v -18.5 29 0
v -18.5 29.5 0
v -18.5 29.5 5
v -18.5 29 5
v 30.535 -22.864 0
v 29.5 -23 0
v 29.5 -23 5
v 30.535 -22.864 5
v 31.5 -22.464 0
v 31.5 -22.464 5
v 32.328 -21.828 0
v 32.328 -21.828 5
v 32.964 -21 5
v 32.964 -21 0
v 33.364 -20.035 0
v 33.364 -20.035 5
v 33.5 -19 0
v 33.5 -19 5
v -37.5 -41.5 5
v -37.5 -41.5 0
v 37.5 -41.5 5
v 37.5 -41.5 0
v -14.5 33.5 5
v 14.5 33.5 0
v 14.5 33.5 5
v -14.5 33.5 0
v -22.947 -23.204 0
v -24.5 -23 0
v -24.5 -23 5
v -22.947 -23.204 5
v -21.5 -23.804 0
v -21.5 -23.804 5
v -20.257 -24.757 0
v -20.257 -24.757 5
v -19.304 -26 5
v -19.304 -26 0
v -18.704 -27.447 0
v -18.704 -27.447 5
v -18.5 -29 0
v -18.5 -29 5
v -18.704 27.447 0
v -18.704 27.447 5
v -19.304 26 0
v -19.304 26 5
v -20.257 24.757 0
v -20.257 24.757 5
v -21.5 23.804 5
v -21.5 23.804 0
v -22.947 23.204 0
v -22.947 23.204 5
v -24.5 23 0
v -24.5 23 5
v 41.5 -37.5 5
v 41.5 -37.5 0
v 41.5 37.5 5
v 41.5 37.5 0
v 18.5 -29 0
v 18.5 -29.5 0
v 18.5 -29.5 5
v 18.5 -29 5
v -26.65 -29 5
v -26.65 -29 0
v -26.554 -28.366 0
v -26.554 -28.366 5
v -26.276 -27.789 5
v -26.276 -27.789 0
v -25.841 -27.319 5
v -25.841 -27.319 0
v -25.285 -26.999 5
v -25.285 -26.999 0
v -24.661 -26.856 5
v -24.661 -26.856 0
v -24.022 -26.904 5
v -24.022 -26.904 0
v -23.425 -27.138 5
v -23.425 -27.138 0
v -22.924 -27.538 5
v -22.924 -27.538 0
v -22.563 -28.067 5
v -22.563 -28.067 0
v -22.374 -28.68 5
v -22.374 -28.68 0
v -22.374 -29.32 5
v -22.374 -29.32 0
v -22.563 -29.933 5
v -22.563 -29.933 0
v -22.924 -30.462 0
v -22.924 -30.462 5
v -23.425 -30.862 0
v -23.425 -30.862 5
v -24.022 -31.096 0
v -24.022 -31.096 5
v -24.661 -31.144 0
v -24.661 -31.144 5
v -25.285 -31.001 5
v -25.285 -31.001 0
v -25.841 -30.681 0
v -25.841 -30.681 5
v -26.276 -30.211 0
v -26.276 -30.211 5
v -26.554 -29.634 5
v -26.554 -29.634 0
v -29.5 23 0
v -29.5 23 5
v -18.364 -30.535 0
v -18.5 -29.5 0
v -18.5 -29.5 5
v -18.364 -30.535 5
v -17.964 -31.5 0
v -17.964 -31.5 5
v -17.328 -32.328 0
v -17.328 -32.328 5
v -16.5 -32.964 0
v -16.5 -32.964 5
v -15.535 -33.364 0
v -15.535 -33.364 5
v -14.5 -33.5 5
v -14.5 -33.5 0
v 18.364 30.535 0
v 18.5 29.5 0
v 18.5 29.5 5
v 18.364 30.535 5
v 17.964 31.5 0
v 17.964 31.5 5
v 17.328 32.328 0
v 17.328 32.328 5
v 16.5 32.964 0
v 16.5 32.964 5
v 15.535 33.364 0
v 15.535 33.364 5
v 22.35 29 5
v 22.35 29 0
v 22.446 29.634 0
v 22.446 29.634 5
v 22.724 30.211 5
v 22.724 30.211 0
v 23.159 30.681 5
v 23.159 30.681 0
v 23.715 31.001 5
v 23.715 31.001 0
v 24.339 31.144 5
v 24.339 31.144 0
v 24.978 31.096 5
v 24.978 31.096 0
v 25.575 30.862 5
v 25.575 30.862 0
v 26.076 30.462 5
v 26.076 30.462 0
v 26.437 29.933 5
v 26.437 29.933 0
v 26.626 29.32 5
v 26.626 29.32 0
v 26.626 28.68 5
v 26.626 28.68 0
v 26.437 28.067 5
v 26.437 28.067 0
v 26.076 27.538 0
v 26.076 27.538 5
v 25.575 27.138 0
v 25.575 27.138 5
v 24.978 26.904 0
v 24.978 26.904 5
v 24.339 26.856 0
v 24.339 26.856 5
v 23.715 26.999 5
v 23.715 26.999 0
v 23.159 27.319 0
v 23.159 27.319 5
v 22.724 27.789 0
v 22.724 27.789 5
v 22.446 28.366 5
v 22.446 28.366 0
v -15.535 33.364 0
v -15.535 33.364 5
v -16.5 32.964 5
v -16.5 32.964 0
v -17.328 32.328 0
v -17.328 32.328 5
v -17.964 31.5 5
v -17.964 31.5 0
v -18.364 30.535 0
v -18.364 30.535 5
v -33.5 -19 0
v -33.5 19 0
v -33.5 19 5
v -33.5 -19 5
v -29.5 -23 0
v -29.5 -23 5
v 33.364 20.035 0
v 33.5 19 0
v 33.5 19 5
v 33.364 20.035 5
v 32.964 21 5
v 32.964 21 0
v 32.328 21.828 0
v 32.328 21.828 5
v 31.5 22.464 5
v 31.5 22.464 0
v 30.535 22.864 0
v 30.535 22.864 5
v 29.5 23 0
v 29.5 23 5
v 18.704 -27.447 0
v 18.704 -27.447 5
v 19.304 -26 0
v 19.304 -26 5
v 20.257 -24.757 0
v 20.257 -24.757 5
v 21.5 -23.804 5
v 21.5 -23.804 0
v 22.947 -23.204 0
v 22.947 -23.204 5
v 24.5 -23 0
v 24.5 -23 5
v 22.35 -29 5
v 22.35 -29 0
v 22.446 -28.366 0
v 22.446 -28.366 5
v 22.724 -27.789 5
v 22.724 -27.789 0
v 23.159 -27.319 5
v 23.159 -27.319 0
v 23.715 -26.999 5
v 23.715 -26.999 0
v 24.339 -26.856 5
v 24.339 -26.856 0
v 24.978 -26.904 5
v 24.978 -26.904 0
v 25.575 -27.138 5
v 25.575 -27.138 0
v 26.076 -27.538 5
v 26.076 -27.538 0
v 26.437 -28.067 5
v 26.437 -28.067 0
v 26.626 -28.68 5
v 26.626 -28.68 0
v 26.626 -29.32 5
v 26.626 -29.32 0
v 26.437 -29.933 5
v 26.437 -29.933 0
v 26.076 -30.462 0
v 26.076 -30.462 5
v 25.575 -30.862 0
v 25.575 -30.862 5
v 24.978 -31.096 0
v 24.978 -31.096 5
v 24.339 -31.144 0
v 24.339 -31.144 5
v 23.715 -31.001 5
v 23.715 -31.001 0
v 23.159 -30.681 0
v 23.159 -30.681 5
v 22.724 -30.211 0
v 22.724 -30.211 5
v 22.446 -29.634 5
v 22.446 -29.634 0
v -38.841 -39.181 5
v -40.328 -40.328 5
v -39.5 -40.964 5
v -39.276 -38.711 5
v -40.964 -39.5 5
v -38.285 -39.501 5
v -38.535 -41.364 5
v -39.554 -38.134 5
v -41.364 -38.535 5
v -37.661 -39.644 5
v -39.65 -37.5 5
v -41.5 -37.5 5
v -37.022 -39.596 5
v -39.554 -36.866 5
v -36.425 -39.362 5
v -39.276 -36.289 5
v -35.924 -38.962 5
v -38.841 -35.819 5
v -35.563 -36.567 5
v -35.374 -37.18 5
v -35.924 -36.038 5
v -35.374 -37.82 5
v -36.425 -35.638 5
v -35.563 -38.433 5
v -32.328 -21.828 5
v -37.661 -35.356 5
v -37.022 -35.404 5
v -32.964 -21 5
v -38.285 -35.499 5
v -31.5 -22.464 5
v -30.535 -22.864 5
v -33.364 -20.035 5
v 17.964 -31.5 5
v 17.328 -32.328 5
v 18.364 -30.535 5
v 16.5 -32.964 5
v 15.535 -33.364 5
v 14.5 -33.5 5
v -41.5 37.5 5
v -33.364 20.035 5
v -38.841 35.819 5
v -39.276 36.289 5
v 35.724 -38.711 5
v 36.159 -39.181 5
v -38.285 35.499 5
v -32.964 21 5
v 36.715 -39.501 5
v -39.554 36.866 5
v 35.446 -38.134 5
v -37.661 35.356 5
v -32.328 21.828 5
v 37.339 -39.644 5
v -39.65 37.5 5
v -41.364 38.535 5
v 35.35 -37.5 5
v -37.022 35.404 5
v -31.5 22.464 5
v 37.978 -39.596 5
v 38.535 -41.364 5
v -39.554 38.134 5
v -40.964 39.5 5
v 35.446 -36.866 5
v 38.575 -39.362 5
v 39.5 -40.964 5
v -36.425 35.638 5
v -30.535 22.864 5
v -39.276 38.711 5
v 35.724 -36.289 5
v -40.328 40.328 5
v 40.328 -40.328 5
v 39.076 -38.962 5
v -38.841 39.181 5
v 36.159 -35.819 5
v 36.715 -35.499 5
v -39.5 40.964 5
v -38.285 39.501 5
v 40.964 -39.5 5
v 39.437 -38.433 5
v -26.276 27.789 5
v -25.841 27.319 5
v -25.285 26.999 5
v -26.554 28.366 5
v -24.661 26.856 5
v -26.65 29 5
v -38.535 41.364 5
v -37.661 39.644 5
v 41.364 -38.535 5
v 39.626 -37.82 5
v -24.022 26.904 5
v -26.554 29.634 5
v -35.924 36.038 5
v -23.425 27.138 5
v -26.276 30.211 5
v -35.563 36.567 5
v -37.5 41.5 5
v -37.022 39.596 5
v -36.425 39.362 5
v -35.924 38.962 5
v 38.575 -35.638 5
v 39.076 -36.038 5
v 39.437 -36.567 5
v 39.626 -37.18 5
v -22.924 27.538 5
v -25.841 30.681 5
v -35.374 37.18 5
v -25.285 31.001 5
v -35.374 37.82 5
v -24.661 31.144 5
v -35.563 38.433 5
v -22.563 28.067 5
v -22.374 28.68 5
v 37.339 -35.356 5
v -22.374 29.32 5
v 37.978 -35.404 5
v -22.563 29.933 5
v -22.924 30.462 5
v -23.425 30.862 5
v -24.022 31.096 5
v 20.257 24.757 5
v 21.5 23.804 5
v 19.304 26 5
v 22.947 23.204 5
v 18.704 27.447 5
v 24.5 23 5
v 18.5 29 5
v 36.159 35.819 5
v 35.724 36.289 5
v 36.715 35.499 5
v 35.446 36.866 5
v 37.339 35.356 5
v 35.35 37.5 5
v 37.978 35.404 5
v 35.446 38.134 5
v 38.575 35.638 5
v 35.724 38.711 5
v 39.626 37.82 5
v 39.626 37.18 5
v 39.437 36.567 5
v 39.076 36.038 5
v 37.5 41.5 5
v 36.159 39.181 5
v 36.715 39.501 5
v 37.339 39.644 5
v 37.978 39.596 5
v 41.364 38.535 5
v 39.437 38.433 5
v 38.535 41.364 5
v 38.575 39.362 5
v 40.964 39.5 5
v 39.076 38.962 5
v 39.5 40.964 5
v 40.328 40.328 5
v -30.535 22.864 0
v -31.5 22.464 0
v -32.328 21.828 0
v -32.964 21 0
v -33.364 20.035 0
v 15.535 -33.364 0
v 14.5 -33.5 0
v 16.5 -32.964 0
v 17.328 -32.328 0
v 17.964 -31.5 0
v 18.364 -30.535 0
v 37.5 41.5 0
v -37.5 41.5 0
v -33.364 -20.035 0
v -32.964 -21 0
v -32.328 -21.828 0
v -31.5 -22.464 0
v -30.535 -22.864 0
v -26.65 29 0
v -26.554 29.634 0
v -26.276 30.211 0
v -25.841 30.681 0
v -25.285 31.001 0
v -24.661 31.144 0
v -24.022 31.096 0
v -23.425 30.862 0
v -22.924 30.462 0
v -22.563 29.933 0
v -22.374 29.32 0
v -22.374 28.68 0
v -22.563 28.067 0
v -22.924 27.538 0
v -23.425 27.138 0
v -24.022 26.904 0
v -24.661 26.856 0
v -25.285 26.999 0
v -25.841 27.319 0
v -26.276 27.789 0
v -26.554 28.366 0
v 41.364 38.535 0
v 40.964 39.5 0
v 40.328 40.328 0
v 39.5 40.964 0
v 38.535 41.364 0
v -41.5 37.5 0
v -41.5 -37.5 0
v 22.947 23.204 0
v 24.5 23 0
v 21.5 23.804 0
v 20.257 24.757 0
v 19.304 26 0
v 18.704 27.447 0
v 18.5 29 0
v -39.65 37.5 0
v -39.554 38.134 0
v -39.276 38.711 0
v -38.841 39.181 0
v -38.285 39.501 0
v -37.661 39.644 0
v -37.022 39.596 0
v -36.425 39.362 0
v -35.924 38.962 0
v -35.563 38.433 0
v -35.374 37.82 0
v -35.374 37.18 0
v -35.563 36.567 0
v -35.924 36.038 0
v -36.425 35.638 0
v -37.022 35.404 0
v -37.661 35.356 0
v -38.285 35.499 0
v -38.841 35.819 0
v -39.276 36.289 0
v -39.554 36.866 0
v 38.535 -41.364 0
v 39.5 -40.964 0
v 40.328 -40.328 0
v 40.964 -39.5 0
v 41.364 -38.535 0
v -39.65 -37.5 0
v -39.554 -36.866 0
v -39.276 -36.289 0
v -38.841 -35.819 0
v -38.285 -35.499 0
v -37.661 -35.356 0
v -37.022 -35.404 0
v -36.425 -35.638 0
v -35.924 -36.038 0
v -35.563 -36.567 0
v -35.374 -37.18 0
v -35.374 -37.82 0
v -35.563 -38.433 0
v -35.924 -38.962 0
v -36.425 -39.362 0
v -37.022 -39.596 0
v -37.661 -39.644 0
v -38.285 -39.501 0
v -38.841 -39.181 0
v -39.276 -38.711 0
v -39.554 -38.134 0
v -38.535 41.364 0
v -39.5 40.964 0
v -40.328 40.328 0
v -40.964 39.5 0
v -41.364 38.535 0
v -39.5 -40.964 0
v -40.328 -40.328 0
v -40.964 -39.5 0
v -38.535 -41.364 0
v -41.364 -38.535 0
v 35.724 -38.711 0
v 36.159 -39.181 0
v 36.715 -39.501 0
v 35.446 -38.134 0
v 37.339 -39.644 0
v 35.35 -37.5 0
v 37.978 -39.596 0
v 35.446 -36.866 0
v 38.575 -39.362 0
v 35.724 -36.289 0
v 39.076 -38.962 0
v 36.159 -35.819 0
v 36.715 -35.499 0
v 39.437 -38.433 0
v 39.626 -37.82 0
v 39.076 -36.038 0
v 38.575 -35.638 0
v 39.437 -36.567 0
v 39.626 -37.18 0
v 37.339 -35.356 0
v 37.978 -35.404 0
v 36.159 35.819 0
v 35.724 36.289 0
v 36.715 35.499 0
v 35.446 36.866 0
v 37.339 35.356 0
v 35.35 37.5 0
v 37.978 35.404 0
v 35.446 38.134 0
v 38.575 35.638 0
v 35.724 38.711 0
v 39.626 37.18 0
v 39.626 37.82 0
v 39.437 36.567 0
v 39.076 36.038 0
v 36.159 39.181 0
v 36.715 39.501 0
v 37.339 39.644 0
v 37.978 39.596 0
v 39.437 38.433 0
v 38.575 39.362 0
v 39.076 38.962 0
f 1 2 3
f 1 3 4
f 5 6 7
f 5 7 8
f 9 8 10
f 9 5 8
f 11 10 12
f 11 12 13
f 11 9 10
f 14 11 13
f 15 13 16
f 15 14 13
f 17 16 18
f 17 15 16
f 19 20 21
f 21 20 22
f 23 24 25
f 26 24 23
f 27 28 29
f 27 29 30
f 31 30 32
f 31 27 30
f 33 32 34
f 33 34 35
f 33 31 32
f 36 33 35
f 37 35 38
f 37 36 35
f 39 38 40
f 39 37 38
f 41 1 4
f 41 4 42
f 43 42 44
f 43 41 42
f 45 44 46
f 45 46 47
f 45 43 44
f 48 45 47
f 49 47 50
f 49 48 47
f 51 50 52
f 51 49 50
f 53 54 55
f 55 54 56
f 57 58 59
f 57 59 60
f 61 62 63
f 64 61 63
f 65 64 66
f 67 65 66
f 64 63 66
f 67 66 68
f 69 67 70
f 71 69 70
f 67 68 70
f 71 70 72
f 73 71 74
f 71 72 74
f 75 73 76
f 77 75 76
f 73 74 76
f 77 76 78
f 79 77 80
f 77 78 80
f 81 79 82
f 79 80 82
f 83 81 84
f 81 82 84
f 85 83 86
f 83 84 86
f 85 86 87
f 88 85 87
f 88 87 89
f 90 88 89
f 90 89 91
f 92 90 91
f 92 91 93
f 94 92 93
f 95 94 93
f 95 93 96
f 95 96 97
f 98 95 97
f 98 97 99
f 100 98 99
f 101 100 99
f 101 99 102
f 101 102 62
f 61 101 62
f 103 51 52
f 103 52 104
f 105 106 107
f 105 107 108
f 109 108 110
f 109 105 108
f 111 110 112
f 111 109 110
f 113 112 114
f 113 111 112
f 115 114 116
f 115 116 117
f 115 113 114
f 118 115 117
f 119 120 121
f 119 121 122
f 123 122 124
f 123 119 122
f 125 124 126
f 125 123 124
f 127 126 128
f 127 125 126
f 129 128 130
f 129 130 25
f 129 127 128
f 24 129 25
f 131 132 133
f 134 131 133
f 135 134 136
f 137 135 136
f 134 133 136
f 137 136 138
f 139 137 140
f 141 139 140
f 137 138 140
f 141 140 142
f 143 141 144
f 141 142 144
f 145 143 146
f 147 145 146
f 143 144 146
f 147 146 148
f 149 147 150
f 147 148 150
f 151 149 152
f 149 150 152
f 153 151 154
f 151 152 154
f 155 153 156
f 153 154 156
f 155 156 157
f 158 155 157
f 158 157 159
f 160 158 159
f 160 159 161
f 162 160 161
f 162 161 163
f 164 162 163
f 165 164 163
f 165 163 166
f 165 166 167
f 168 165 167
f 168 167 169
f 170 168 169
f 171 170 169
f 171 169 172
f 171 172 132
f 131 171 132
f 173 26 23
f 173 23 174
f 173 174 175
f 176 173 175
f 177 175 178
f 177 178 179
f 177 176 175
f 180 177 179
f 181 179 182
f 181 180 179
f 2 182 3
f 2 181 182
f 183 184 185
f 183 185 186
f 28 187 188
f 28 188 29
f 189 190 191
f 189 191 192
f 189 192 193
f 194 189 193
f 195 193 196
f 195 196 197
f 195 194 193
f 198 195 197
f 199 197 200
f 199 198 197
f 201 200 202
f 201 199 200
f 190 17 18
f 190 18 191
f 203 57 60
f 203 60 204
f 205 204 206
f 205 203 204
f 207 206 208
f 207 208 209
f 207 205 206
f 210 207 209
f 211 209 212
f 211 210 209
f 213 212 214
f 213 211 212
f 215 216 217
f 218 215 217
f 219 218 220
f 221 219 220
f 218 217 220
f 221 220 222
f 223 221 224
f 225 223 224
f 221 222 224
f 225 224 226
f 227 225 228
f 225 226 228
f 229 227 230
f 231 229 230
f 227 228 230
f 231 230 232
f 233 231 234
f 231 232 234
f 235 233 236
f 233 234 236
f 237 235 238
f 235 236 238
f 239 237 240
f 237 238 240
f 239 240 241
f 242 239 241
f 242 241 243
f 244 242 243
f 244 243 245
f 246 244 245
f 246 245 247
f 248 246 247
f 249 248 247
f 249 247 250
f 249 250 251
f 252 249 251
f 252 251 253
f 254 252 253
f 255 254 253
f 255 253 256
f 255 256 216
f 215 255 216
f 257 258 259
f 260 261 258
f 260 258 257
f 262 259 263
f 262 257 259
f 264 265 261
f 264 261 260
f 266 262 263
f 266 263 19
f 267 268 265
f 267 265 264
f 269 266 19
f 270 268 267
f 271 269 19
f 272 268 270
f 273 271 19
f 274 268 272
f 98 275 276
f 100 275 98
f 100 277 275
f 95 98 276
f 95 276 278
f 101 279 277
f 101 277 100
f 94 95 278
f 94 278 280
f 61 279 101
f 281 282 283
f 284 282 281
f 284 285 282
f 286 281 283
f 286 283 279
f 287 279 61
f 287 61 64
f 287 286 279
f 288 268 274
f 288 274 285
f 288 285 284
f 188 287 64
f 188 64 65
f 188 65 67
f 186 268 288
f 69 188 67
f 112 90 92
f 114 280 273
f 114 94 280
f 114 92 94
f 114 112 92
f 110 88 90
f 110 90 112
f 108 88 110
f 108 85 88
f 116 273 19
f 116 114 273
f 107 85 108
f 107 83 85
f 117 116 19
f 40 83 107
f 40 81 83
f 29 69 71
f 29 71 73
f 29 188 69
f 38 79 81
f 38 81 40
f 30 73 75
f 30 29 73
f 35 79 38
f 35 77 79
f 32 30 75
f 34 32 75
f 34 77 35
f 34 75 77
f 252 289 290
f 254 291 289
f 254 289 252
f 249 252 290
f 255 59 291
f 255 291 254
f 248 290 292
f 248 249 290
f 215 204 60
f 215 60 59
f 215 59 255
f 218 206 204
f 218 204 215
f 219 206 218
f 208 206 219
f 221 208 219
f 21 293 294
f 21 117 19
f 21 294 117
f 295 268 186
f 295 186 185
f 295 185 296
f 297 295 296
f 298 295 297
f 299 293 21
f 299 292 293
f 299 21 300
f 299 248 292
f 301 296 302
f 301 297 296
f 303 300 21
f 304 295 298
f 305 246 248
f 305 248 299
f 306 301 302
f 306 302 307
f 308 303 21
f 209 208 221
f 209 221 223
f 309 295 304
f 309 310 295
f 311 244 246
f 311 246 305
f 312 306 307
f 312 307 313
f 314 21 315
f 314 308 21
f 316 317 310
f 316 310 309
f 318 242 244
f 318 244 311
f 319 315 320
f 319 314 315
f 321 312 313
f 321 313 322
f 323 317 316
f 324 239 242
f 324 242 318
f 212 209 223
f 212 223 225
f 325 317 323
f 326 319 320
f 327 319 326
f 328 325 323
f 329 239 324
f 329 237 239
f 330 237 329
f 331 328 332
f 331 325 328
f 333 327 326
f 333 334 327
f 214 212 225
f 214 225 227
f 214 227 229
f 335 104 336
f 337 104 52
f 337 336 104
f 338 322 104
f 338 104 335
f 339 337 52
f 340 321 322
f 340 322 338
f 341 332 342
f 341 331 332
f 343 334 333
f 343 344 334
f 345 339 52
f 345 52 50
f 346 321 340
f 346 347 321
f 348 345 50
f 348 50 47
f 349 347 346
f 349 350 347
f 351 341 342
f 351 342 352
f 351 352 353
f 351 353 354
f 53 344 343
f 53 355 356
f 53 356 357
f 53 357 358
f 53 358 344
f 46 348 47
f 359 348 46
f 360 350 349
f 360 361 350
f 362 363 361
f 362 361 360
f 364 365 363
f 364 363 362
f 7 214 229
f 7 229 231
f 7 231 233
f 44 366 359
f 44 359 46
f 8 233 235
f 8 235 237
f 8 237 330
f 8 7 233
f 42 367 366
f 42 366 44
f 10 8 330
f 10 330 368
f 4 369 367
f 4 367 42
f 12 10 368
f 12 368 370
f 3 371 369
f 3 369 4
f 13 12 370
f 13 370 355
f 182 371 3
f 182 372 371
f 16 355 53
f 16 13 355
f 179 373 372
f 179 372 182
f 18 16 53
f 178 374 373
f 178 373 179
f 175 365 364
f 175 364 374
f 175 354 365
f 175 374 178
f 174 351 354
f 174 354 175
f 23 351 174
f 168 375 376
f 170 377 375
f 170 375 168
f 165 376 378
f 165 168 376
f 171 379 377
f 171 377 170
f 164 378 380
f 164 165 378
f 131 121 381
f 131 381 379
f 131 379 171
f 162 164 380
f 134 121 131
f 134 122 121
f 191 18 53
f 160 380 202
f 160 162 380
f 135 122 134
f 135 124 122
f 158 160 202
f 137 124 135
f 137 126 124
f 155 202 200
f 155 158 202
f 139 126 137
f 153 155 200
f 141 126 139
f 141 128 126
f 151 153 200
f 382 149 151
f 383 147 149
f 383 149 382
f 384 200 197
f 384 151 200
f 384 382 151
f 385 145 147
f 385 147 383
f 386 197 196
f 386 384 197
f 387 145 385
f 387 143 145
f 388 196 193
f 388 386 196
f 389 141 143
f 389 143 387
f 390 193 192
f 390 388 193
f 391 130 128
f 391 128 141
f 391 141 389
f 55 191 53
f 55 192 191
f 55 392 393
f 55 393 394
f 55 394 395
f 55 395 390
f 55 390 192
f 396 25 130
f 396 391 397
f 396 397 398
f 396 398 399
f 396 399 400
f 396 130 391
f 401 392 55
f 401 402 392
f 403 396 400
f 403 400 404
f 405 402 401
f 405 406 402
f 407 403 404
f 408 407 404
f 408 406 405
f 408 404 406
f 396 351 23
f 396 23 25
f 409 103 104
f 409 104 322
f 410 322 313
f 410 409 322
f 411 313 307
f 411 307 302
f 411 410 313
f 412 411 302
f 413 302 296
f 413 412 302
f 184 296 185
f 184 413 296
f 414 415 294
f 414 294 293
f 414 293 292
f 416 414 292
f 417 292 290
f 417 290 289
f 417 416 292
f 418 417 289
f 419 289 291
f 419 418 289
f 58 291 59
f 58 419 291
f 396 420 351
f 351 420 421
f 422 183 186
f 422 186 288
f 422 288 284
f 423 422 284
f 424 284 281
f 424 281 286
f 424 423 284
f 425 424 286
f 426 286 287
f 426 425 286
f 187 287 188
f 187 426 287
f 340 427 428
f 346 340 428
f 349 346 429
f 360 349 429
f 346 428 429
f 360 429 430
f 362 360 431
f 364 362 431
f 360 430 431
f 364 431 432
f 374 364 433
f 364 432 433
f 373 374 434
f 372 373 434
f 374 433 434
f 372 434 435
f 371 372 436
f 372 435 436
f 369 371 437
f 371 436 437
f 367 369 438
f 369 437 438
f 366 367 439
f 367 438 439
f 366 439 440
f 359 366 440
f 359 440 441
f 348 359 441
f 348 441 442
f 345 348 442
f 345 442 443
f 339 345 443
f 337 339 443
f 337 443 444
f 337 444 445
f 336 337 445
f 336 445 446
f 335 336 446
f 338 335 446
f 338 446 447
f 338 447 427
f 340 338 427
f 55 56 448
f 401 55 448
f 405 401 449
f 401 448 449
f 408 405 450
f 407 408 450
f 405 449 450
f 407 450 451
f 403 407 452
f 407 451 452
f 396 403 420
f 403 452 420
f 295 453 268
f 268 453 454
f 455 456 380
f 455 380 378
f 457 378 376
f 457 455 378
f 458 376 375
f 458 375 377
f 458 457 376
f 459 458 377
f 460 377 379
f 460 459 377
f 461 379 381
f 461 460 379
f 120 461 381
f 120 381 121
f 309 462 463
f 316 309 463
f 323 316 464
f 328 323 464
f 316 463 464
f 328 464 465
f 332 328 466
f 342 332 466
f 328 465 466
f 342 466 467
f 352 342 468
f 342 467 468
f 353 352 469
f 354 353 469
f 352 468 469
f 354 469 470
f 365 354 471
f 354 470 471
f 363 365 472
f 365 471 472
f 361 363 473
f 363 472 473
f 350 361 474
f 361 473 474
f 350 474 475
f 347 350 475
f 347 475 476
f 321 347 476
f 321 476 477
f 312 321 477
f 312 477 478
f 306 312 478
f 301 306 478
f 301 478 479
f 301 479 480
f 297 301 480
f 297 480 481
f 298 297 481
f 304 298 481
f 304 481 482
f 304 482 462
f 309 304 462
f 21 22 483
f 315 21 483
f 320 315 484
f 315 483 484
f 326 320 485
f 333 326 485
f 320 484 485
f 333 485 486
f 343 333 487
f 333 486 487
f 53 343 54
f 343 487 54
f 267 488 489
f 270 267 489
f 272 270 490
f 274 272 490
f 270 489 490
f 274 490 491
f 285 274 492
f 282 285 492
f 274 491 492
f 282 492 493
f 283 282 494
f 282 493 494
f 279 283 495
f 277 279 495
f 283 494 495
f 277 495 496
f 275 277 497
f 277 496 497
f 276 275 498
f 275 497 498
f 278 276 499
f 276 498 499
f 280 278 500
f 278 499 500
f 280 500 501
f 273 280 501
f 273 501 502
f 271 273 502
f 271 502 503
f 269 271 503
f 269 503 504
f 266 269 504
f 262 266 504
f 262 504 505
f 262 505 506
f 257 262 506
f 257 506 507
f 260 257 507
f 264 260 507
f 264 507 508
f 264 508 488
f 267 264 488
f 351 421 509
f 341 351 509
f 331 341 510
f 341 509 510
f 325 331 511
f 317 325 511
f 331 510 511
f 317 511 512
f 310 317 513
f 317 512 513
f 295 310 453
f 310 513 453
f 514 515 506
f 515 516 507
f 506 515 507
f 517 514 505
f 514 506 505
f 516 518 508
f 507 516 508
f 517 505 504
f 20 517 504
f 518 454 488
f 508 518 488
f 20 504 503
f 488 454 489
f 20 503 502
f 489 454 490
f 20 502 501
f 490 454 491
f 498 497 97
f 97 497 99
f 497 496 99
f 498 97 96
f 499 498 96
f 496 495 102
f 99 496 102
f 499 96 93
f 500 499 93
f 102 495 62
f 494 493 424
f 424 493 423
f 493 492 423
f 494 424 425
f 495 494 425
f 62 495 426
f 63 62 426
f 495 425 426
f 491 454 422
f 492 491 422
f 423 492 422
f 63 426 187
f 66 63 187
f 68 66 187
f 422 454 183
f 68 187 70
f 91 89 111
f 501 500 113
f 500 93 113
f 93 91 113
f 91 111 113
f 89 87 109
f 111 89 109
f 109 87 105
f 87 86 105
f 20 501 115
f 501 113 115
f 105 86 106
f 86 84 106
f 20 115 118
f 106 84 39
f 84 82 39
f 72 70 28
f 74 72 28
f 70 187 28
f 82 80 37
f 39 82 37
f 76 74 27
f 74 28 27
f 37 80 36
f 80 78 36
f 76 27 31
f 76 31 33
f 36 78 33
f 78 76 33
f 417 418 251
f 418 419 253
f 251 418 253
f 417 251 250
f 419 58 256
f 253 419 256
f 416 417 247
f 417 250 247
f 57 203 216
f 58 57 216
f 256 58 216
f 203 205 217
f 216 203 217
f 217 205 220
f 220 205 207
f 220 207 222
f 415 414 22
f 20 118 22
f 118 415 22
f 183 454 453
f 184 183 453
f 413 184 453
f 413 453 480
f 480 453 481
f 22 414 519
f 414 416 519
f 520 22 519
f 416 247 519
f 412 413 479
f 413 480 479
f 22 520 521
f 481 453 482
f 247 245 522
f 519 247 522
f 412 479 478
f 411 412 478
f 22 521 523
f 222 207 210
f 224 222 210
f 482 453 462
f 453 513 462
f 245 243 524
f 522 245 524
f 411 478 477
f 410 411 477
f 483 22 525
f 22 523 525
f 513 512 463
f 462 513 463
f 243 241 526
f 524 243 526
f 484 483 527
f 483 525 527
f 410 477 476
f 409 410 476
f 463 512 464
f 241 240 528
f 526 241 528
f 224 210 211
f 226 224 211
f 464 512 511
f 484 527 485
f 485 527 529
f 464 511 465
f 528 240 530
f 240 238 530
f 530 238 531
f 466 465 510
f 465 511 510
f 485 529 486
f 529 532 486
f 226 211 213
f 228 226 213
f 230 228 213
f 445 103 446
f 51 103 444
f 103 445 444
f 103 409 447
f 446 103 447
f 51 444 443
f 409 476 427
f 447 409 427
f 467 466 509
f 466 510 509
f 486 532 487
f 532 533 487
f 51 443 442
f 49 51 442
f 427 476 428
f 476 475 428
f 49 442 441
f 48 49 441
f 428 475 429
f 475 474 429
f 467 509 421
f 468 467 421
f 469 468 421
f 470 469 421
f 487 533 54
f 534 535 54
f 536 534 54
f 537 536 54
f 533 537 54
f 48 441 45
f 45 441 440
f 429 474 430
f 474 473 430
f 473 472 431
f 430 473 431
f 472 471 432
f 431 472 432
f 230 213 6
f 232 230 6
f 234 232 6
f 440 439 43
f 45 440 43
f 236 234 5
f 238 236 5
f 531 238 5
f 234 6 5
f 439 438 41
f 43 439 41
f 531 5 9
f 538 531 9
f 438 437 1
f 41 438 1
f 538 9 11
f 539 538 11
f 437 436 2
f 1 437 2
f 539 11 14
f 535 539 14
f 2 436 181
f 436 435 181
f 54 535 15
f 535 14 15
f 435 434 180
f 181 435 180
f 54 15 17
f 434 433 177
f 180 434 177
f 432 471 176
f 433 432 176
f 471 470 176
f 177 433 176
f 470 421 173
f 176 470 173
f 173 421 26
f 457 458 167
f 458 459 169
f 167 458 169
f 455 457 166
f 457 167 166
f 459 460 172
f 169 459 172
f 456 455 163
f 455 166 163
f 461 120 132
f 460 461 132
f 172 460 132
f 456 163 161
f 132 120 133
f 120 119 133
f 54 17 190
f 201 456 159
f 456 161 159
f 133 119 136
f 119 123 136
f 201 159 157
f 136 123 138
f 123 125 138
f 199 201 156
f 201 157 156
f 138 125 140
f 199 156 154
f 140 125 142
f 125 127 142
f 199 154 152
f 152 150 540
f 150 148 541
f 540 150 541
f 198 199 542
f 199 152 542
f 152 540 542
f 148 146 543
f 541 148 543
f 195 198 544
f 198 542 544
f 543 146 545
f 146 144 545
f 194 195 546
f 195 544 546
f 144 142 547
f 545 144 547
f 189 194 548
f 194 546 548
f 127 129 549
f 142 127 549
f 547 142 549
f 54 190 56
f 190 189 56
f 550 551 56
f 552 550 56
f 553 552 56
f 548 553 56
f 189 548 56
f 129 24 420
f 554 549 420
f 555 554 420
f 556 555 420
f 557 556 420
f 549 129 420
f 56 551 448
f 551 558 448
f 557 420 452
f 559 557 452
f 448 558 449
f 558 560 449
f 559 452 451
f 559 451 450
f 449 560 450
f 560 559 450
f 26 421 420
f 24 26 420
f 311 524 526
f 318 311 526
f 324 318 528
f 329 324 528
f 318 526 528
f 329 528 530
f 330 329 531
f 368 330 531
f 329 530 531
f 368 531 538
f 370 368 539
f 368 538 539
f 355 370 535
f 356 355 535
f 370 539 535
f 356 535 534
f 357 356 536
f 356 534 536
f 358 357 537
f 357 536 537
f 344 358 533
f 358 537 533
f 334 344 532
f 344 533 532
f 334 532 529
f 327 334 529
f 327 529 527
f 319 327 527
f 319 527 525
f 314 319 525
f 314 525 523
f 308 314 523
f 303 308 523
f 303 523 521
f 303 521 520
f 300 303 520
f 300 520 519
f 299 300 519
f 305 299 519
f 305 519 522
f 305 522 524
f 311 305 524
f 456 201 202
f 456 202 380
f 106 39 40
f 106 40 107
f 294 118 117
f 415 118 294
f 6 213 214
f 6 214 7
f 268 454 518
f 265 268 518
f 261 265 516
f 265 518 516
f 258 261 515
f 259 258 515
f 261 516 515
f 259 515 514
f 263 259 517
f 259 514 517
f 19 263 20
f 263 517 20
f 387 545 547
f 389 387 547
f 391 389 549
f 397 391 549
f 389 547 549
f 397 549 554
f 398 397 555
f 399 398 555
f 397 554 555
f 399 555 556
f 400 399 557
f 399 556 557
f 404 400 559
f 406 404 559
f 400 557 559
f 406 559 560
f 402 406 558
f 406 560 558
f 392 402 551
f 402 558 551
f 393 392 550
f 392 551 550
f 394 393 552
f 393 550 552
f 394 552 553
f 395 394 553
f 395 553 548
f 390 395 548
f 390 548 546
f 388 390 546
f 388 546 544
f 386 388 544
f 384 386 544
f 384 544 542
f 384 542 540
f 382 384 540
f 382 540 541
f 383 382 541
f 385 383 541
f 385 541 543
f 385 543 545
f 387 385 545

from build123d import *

# Parameters (mm, degrees)
BOSS_EXTRU_1_DEPTH   = 5
D_GAGEMENT_M41_D     = 4.3
D_GAGEMENT_M41_DEPTH = 10
D_GAGEMENT_M41_TIP   = 1.291850331


with BuildPart() as part:
    # Esquisse1 → Boss.-Extru.1 (new body)
    with BuildSketch(Plane.XY):
        with BuildLine():
            Line((-37.5, -41.5), (37.5, -41.5))
            ThreePointArc((37.5, -41.5), (40.328427125, -40.328427125), (41.5, -37.5))
            Line((41.5, -37.5), (41.5, 37.5))
            ThreePointArc((41.5, 37.5), (40.328427125, 40.328427125), (37.5, 41.5))
            Line((37.5, 41.5), (-37.5, 41.5))
            ThreePointArc((-37.5, 41.5), (-40.328427125, 40.328427125), (-41.5, 37.5))
            Line((-41.5, 37.5), (-41.5, -37.5))
            ThreePointArc((-41.5, -37.5), (-40.328427125, -40.328427125), (-37.5, -41.5))
        make_face()
        with BuildLine():
            Line((-14.5, -33.5), (14.5, -33.5))
            ThreePointArc((14.5, -33.5), (17.328427125, -32.328427125), (18.5, -29.5))
            Line((18.5, -29.5), (18.5, -29))
            ThreePointArc((18.5, -29), (20.257359313, -24.757359313), (24.5, -23))
            Line((24.5, -23), (29.5, -23))
            ThreePointArc((29.5, -23), (32.328427125, -21.828427125), (33.5, -19))
            Line((33.5, -19), (33.5, 19))
            ThreePointArc((33.5, 19), (32.328427125, 21.828427125), (29.5, 23))
            Line((29.5, 23), (24.5, 23))
            ThreePointArc((24.5, 23), (20.257359313, 24.757359313), (18.5, 29))
            Line((18.5, 29), (18.5, 29.5))
            ThreePointArc((18.5, 29.5), (17.328427125, 32.328427125), (14.5, 33.5))
            Line((14.5, 33.5), (-14.5, 33.5))
            ThreePointArc((-14.5, 33.5), (-17.328427125, 32.328427125), (-18.5, 29.5))
            Line((-18.5, 29.5), (-18.5, 29))
            ThreePointArc((-18.5, 29), (-20.257359313, 24.757359313), (-24.5, 23))
            Line((-24.5, 23), (-29.5, 23))
            ThreePointArc((-29.5, 23), (-32.328427125, 21.828427125), (-33.5, 19))
            Line((-33.5, 19), (-33.5, -19))
            ThreePointArc((-33.5, -19), (-32.328427125, -21.828427125), (-29.5, -23))
            Line((-29.5, -23), (-24.5, -23))
            ThreePointArc((-24.5, -23), (-20.257359313, -24.757359313), (-18.5, -29))
            Line((-18.5, -29), (-18.5, -29.5))
            ThreePointArc((-18.5, -29.5), (-17.328427125, -32.328427125), (-14.5, -33.5))
        make_face(mode=Mode.SUBTRACT)
    extrude(amount=BOSS_EXTRU_1_DEPTH)

    # Dégagement M41
    with Locations(Plane.XY.offset(5)):
        with Locations((-37.5, 37.5), (37.5, 37.5), (37.5, -37.5), (-37.5, -37.5), (-24.5, 29), (24.5, 29), (24.5, -29), (-24.5, -29)):
            Hole(D_GAGEMENT_M41_D / 2, depth=D_GAGEMENT_M41_DEPTH)
            with Locations((0, 0, -(D_GAGEMENT_M41_DEPTH + D_GAGEMENT_M41_TIP / 2))):  # 118° drill point
                Cone(0, D_GAGEMENT_M41_D / 2, D_GAGEMENT_M41_TIP, mode=Mode.SUBTRACT)


solid = part.part
